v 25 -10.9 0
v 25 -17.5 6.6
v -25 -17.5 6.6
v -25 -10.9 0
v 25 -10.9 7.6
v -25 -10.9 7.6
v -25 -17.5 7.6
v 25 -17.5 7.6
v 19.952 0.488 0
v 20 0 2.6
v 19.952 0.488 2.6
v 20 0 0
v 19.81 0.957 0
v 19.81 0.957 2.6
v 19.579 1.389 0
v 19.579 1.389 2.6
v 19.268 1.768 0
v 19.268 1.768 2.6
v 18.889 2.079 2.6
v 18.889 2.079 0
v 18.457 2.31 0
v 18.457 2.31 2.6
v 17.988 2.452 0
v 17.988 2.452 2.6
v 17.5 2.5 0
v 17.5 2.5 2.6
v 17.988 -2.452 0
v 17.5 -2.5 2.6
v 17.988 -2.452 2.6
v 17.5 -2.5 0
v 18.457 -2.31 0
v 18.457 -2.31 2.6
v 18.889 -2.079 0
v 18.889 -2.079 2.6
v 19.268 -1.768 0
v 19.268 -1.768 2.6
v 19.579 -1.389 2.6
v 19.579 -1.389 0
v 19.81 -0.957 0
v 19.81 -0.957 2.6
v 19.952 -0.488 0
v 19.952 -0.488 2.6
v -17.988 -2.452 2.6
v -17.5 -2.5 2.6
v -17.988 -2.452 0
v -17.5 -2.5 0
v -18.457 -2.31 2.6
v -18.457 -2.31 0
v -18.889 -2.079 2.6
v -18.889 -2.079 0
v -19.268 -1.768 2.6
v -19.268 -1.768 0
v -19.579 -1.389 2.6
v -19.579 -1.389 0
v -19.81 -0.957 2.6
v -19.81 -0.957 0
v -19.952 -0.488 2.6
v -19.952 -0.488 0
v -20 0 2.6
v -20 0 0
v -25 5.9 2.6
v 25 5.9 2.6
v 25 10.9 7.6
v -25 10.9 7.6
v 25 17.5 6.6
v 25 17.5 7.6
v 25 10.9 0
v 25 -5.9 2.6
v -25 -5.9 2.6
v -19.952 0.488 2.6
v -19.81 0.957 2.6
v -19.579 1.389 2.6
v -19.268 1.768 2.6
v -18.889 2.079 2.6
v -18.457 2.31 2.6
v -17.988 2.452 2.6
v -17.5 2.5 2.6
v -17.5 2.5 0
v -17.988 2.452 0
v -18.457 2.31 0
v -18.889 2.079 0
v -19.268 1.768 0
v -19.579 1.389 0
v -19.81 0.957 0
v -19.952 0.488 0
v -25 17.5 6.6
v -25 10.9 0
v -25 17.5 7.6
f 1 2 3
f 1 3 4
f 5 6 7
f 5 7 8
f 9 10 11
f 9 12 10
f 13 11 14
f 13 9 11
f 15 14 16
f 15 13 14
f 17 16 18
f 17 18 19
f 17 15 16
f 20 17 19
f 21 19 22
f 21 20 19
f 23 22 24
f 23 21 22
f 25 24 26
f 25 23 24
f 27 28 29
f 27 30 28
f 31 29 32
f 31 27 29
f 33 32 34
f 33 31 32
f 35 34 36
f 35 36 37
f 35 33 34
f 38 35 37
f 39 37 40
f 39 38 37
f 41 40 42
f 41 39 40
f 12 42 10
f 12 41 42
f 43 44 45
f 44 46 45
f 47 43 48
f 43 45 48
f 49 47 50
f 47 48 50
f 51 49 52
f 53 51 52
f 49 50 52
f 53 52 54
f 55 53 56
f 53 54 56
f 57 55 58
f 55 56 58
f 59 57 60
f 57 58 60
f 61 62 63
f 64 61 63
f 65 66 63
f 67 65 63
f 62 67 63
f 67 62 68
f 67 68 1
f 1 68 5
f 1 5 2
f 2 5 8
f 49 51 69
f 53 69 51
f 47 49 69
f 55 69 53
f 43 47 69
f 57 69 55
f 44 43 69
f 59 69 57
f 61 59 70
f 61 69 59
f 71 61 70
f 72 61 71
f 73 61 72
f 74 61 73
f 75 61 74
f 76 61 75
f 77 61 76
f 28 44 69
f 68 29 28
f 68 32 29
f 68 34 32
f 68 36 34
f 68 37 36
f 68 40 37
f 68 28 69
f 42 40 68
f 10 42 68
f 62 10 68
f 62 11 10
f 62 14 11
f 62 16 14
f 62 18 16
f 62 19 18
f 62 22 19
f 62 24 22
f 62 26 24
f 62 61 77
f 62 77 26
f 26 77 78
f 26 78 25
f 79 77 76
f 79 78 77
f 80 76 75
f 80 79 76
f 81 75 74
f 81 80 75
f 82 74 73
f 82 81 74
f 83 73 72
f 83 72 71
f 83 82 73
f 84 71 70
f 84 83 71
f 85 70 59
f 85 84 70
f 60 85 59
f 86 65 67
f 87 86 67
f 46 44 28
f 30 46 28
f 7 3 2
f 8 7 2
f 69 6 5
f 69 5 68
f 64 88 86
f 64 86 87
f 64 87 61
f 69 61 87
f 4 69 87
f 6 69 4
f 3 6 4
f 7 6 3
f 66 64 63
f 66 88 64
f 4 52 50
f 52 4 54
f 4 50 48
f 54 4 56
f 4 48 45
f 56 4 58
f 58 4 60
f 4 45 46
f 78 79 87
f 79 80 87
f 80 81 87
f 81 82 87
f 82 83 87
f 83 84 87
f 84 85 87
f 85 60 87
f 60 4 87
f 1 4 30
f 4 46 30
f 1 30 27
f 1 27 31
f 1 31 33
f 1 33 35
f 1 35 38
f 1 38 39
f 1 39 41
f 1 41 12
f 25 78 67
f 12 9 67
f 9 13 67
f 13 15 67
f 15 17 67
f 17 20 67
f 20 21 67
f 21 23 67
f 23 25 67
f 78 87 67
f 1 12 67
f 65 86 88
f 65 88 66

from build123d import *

# Parameters (mm, degrees)
F0_W         = 50
F0_H         = 35
F1_DEPTH     = 7.6
F2_W         = 50
F2_H         = 25
F3_DEPTH     = 5
F4_T4_DEPTH  = 50
F4_T9_DEPTH  = 50
F4_T11_DEPTH = 83.9462154412
F5_W         = 40
F5_H         = 5
F6_DEPTH     = 2.6
F7_R         = 2.49999


# Not quite as in the source:
# - a fillet or chamfer that OpenCascade refuses, or shapes differently, is made with other operations: its cross-section is extruded or revolved along the edge and cut away or added
# - a fillet or chamfer is up to 0.001 mm smaller than in the source, because OpenCascade refuses the exact size


with BuildPart() as f1:
    # F0 (on Top) → F1 (new body)
    with BuildSketch(Plane.XY):
        Rectangle(F0_W, F0_H)
    extrude(amount=F1_DEPTH)

    # F2 (on face) → F3 (cut)
    with BuildSketch(Plane.XY.offset(7.6)):
        Rectangle(F2_W, F2_H)
    extrude(amount=-F3_DEPTH, mode=Mode.SUBTRACT)

    # F4: chamfer of 6.6 on 4 edges, made by hand


with BuildPart() as f4_tool2:
    # F4_s3 → F4_t4 (new body)
    with BuildSketch(Plane.YZ.offset(25)):
        Polygon((5.9, 2.6), (12.5, 9.2), (12.5, 2.6), align=None)
    extrude(amount=-F4_T4_DEPTH)

    split(bisect_by=Plane.XY.offset(7.6), keep=Keep.BOTTOM)


with BuildPart() as f1_1:
    add(f1.part)

    # F4_t1: union F4_tool2
    add(f4_tool2.part)


with BuildPart() as f4_tool7:
    # F4_s8 → F4_t9 (new body)
    with BuildSketch(Plane.YZ.offset(-25)):
        Polygon((-12.5, 9.2), (-5.9, 2.6), (-12.5, 2.6), align=None)
    extrude(amount=F4_T9_DEPTH)

    split(bisect_by=Plane.XY.offset(7.6), keep=Keep.BOTTOM)


with BuildPart() as f1_2:
    add(f1_1.part)

    # F4_t6: union F4_tool7
    add(f4_tool7.part)

    # F4_s12 → F4_t11 (cut)
    with BuildSketch(Plane.YZ.offset(-41.9731077206)):
        Polygon((17.5, 6.6), (10.9, 0), (17.5, 0), align=None)
        Polygon((-17.5, 6.6), (-10.9, 0), (-17.5, 0), align=None)
    extrude(amount=F4_T11_DEPTH, mode=Mode.SUBTRACT)

    # F5 (on face) → F6 (cut, through all)
    with BuildSketch(Plane.XY.offset(2.6)):
        Rectangle(F5_W, F5_H)
    extrude(amount=-F6_DEPTH, mode=Mode.SUBTRACT)

    # F7 (radius 2.5 in the source; OpenCascade refuses exactly that, so slightly less here)
    f7_edges = [f1_2.edges().sort_by_distance(p)[0] for p in [
        (-20, -2.5, 1.3),
        (-20, 2.5, 1.3),
        (20, 2.5, 1.3),
        (20, -2.5, 1.3),
    ]]
    fillet(f7_edges, radius=F7_R)


solid = f1_2.part
